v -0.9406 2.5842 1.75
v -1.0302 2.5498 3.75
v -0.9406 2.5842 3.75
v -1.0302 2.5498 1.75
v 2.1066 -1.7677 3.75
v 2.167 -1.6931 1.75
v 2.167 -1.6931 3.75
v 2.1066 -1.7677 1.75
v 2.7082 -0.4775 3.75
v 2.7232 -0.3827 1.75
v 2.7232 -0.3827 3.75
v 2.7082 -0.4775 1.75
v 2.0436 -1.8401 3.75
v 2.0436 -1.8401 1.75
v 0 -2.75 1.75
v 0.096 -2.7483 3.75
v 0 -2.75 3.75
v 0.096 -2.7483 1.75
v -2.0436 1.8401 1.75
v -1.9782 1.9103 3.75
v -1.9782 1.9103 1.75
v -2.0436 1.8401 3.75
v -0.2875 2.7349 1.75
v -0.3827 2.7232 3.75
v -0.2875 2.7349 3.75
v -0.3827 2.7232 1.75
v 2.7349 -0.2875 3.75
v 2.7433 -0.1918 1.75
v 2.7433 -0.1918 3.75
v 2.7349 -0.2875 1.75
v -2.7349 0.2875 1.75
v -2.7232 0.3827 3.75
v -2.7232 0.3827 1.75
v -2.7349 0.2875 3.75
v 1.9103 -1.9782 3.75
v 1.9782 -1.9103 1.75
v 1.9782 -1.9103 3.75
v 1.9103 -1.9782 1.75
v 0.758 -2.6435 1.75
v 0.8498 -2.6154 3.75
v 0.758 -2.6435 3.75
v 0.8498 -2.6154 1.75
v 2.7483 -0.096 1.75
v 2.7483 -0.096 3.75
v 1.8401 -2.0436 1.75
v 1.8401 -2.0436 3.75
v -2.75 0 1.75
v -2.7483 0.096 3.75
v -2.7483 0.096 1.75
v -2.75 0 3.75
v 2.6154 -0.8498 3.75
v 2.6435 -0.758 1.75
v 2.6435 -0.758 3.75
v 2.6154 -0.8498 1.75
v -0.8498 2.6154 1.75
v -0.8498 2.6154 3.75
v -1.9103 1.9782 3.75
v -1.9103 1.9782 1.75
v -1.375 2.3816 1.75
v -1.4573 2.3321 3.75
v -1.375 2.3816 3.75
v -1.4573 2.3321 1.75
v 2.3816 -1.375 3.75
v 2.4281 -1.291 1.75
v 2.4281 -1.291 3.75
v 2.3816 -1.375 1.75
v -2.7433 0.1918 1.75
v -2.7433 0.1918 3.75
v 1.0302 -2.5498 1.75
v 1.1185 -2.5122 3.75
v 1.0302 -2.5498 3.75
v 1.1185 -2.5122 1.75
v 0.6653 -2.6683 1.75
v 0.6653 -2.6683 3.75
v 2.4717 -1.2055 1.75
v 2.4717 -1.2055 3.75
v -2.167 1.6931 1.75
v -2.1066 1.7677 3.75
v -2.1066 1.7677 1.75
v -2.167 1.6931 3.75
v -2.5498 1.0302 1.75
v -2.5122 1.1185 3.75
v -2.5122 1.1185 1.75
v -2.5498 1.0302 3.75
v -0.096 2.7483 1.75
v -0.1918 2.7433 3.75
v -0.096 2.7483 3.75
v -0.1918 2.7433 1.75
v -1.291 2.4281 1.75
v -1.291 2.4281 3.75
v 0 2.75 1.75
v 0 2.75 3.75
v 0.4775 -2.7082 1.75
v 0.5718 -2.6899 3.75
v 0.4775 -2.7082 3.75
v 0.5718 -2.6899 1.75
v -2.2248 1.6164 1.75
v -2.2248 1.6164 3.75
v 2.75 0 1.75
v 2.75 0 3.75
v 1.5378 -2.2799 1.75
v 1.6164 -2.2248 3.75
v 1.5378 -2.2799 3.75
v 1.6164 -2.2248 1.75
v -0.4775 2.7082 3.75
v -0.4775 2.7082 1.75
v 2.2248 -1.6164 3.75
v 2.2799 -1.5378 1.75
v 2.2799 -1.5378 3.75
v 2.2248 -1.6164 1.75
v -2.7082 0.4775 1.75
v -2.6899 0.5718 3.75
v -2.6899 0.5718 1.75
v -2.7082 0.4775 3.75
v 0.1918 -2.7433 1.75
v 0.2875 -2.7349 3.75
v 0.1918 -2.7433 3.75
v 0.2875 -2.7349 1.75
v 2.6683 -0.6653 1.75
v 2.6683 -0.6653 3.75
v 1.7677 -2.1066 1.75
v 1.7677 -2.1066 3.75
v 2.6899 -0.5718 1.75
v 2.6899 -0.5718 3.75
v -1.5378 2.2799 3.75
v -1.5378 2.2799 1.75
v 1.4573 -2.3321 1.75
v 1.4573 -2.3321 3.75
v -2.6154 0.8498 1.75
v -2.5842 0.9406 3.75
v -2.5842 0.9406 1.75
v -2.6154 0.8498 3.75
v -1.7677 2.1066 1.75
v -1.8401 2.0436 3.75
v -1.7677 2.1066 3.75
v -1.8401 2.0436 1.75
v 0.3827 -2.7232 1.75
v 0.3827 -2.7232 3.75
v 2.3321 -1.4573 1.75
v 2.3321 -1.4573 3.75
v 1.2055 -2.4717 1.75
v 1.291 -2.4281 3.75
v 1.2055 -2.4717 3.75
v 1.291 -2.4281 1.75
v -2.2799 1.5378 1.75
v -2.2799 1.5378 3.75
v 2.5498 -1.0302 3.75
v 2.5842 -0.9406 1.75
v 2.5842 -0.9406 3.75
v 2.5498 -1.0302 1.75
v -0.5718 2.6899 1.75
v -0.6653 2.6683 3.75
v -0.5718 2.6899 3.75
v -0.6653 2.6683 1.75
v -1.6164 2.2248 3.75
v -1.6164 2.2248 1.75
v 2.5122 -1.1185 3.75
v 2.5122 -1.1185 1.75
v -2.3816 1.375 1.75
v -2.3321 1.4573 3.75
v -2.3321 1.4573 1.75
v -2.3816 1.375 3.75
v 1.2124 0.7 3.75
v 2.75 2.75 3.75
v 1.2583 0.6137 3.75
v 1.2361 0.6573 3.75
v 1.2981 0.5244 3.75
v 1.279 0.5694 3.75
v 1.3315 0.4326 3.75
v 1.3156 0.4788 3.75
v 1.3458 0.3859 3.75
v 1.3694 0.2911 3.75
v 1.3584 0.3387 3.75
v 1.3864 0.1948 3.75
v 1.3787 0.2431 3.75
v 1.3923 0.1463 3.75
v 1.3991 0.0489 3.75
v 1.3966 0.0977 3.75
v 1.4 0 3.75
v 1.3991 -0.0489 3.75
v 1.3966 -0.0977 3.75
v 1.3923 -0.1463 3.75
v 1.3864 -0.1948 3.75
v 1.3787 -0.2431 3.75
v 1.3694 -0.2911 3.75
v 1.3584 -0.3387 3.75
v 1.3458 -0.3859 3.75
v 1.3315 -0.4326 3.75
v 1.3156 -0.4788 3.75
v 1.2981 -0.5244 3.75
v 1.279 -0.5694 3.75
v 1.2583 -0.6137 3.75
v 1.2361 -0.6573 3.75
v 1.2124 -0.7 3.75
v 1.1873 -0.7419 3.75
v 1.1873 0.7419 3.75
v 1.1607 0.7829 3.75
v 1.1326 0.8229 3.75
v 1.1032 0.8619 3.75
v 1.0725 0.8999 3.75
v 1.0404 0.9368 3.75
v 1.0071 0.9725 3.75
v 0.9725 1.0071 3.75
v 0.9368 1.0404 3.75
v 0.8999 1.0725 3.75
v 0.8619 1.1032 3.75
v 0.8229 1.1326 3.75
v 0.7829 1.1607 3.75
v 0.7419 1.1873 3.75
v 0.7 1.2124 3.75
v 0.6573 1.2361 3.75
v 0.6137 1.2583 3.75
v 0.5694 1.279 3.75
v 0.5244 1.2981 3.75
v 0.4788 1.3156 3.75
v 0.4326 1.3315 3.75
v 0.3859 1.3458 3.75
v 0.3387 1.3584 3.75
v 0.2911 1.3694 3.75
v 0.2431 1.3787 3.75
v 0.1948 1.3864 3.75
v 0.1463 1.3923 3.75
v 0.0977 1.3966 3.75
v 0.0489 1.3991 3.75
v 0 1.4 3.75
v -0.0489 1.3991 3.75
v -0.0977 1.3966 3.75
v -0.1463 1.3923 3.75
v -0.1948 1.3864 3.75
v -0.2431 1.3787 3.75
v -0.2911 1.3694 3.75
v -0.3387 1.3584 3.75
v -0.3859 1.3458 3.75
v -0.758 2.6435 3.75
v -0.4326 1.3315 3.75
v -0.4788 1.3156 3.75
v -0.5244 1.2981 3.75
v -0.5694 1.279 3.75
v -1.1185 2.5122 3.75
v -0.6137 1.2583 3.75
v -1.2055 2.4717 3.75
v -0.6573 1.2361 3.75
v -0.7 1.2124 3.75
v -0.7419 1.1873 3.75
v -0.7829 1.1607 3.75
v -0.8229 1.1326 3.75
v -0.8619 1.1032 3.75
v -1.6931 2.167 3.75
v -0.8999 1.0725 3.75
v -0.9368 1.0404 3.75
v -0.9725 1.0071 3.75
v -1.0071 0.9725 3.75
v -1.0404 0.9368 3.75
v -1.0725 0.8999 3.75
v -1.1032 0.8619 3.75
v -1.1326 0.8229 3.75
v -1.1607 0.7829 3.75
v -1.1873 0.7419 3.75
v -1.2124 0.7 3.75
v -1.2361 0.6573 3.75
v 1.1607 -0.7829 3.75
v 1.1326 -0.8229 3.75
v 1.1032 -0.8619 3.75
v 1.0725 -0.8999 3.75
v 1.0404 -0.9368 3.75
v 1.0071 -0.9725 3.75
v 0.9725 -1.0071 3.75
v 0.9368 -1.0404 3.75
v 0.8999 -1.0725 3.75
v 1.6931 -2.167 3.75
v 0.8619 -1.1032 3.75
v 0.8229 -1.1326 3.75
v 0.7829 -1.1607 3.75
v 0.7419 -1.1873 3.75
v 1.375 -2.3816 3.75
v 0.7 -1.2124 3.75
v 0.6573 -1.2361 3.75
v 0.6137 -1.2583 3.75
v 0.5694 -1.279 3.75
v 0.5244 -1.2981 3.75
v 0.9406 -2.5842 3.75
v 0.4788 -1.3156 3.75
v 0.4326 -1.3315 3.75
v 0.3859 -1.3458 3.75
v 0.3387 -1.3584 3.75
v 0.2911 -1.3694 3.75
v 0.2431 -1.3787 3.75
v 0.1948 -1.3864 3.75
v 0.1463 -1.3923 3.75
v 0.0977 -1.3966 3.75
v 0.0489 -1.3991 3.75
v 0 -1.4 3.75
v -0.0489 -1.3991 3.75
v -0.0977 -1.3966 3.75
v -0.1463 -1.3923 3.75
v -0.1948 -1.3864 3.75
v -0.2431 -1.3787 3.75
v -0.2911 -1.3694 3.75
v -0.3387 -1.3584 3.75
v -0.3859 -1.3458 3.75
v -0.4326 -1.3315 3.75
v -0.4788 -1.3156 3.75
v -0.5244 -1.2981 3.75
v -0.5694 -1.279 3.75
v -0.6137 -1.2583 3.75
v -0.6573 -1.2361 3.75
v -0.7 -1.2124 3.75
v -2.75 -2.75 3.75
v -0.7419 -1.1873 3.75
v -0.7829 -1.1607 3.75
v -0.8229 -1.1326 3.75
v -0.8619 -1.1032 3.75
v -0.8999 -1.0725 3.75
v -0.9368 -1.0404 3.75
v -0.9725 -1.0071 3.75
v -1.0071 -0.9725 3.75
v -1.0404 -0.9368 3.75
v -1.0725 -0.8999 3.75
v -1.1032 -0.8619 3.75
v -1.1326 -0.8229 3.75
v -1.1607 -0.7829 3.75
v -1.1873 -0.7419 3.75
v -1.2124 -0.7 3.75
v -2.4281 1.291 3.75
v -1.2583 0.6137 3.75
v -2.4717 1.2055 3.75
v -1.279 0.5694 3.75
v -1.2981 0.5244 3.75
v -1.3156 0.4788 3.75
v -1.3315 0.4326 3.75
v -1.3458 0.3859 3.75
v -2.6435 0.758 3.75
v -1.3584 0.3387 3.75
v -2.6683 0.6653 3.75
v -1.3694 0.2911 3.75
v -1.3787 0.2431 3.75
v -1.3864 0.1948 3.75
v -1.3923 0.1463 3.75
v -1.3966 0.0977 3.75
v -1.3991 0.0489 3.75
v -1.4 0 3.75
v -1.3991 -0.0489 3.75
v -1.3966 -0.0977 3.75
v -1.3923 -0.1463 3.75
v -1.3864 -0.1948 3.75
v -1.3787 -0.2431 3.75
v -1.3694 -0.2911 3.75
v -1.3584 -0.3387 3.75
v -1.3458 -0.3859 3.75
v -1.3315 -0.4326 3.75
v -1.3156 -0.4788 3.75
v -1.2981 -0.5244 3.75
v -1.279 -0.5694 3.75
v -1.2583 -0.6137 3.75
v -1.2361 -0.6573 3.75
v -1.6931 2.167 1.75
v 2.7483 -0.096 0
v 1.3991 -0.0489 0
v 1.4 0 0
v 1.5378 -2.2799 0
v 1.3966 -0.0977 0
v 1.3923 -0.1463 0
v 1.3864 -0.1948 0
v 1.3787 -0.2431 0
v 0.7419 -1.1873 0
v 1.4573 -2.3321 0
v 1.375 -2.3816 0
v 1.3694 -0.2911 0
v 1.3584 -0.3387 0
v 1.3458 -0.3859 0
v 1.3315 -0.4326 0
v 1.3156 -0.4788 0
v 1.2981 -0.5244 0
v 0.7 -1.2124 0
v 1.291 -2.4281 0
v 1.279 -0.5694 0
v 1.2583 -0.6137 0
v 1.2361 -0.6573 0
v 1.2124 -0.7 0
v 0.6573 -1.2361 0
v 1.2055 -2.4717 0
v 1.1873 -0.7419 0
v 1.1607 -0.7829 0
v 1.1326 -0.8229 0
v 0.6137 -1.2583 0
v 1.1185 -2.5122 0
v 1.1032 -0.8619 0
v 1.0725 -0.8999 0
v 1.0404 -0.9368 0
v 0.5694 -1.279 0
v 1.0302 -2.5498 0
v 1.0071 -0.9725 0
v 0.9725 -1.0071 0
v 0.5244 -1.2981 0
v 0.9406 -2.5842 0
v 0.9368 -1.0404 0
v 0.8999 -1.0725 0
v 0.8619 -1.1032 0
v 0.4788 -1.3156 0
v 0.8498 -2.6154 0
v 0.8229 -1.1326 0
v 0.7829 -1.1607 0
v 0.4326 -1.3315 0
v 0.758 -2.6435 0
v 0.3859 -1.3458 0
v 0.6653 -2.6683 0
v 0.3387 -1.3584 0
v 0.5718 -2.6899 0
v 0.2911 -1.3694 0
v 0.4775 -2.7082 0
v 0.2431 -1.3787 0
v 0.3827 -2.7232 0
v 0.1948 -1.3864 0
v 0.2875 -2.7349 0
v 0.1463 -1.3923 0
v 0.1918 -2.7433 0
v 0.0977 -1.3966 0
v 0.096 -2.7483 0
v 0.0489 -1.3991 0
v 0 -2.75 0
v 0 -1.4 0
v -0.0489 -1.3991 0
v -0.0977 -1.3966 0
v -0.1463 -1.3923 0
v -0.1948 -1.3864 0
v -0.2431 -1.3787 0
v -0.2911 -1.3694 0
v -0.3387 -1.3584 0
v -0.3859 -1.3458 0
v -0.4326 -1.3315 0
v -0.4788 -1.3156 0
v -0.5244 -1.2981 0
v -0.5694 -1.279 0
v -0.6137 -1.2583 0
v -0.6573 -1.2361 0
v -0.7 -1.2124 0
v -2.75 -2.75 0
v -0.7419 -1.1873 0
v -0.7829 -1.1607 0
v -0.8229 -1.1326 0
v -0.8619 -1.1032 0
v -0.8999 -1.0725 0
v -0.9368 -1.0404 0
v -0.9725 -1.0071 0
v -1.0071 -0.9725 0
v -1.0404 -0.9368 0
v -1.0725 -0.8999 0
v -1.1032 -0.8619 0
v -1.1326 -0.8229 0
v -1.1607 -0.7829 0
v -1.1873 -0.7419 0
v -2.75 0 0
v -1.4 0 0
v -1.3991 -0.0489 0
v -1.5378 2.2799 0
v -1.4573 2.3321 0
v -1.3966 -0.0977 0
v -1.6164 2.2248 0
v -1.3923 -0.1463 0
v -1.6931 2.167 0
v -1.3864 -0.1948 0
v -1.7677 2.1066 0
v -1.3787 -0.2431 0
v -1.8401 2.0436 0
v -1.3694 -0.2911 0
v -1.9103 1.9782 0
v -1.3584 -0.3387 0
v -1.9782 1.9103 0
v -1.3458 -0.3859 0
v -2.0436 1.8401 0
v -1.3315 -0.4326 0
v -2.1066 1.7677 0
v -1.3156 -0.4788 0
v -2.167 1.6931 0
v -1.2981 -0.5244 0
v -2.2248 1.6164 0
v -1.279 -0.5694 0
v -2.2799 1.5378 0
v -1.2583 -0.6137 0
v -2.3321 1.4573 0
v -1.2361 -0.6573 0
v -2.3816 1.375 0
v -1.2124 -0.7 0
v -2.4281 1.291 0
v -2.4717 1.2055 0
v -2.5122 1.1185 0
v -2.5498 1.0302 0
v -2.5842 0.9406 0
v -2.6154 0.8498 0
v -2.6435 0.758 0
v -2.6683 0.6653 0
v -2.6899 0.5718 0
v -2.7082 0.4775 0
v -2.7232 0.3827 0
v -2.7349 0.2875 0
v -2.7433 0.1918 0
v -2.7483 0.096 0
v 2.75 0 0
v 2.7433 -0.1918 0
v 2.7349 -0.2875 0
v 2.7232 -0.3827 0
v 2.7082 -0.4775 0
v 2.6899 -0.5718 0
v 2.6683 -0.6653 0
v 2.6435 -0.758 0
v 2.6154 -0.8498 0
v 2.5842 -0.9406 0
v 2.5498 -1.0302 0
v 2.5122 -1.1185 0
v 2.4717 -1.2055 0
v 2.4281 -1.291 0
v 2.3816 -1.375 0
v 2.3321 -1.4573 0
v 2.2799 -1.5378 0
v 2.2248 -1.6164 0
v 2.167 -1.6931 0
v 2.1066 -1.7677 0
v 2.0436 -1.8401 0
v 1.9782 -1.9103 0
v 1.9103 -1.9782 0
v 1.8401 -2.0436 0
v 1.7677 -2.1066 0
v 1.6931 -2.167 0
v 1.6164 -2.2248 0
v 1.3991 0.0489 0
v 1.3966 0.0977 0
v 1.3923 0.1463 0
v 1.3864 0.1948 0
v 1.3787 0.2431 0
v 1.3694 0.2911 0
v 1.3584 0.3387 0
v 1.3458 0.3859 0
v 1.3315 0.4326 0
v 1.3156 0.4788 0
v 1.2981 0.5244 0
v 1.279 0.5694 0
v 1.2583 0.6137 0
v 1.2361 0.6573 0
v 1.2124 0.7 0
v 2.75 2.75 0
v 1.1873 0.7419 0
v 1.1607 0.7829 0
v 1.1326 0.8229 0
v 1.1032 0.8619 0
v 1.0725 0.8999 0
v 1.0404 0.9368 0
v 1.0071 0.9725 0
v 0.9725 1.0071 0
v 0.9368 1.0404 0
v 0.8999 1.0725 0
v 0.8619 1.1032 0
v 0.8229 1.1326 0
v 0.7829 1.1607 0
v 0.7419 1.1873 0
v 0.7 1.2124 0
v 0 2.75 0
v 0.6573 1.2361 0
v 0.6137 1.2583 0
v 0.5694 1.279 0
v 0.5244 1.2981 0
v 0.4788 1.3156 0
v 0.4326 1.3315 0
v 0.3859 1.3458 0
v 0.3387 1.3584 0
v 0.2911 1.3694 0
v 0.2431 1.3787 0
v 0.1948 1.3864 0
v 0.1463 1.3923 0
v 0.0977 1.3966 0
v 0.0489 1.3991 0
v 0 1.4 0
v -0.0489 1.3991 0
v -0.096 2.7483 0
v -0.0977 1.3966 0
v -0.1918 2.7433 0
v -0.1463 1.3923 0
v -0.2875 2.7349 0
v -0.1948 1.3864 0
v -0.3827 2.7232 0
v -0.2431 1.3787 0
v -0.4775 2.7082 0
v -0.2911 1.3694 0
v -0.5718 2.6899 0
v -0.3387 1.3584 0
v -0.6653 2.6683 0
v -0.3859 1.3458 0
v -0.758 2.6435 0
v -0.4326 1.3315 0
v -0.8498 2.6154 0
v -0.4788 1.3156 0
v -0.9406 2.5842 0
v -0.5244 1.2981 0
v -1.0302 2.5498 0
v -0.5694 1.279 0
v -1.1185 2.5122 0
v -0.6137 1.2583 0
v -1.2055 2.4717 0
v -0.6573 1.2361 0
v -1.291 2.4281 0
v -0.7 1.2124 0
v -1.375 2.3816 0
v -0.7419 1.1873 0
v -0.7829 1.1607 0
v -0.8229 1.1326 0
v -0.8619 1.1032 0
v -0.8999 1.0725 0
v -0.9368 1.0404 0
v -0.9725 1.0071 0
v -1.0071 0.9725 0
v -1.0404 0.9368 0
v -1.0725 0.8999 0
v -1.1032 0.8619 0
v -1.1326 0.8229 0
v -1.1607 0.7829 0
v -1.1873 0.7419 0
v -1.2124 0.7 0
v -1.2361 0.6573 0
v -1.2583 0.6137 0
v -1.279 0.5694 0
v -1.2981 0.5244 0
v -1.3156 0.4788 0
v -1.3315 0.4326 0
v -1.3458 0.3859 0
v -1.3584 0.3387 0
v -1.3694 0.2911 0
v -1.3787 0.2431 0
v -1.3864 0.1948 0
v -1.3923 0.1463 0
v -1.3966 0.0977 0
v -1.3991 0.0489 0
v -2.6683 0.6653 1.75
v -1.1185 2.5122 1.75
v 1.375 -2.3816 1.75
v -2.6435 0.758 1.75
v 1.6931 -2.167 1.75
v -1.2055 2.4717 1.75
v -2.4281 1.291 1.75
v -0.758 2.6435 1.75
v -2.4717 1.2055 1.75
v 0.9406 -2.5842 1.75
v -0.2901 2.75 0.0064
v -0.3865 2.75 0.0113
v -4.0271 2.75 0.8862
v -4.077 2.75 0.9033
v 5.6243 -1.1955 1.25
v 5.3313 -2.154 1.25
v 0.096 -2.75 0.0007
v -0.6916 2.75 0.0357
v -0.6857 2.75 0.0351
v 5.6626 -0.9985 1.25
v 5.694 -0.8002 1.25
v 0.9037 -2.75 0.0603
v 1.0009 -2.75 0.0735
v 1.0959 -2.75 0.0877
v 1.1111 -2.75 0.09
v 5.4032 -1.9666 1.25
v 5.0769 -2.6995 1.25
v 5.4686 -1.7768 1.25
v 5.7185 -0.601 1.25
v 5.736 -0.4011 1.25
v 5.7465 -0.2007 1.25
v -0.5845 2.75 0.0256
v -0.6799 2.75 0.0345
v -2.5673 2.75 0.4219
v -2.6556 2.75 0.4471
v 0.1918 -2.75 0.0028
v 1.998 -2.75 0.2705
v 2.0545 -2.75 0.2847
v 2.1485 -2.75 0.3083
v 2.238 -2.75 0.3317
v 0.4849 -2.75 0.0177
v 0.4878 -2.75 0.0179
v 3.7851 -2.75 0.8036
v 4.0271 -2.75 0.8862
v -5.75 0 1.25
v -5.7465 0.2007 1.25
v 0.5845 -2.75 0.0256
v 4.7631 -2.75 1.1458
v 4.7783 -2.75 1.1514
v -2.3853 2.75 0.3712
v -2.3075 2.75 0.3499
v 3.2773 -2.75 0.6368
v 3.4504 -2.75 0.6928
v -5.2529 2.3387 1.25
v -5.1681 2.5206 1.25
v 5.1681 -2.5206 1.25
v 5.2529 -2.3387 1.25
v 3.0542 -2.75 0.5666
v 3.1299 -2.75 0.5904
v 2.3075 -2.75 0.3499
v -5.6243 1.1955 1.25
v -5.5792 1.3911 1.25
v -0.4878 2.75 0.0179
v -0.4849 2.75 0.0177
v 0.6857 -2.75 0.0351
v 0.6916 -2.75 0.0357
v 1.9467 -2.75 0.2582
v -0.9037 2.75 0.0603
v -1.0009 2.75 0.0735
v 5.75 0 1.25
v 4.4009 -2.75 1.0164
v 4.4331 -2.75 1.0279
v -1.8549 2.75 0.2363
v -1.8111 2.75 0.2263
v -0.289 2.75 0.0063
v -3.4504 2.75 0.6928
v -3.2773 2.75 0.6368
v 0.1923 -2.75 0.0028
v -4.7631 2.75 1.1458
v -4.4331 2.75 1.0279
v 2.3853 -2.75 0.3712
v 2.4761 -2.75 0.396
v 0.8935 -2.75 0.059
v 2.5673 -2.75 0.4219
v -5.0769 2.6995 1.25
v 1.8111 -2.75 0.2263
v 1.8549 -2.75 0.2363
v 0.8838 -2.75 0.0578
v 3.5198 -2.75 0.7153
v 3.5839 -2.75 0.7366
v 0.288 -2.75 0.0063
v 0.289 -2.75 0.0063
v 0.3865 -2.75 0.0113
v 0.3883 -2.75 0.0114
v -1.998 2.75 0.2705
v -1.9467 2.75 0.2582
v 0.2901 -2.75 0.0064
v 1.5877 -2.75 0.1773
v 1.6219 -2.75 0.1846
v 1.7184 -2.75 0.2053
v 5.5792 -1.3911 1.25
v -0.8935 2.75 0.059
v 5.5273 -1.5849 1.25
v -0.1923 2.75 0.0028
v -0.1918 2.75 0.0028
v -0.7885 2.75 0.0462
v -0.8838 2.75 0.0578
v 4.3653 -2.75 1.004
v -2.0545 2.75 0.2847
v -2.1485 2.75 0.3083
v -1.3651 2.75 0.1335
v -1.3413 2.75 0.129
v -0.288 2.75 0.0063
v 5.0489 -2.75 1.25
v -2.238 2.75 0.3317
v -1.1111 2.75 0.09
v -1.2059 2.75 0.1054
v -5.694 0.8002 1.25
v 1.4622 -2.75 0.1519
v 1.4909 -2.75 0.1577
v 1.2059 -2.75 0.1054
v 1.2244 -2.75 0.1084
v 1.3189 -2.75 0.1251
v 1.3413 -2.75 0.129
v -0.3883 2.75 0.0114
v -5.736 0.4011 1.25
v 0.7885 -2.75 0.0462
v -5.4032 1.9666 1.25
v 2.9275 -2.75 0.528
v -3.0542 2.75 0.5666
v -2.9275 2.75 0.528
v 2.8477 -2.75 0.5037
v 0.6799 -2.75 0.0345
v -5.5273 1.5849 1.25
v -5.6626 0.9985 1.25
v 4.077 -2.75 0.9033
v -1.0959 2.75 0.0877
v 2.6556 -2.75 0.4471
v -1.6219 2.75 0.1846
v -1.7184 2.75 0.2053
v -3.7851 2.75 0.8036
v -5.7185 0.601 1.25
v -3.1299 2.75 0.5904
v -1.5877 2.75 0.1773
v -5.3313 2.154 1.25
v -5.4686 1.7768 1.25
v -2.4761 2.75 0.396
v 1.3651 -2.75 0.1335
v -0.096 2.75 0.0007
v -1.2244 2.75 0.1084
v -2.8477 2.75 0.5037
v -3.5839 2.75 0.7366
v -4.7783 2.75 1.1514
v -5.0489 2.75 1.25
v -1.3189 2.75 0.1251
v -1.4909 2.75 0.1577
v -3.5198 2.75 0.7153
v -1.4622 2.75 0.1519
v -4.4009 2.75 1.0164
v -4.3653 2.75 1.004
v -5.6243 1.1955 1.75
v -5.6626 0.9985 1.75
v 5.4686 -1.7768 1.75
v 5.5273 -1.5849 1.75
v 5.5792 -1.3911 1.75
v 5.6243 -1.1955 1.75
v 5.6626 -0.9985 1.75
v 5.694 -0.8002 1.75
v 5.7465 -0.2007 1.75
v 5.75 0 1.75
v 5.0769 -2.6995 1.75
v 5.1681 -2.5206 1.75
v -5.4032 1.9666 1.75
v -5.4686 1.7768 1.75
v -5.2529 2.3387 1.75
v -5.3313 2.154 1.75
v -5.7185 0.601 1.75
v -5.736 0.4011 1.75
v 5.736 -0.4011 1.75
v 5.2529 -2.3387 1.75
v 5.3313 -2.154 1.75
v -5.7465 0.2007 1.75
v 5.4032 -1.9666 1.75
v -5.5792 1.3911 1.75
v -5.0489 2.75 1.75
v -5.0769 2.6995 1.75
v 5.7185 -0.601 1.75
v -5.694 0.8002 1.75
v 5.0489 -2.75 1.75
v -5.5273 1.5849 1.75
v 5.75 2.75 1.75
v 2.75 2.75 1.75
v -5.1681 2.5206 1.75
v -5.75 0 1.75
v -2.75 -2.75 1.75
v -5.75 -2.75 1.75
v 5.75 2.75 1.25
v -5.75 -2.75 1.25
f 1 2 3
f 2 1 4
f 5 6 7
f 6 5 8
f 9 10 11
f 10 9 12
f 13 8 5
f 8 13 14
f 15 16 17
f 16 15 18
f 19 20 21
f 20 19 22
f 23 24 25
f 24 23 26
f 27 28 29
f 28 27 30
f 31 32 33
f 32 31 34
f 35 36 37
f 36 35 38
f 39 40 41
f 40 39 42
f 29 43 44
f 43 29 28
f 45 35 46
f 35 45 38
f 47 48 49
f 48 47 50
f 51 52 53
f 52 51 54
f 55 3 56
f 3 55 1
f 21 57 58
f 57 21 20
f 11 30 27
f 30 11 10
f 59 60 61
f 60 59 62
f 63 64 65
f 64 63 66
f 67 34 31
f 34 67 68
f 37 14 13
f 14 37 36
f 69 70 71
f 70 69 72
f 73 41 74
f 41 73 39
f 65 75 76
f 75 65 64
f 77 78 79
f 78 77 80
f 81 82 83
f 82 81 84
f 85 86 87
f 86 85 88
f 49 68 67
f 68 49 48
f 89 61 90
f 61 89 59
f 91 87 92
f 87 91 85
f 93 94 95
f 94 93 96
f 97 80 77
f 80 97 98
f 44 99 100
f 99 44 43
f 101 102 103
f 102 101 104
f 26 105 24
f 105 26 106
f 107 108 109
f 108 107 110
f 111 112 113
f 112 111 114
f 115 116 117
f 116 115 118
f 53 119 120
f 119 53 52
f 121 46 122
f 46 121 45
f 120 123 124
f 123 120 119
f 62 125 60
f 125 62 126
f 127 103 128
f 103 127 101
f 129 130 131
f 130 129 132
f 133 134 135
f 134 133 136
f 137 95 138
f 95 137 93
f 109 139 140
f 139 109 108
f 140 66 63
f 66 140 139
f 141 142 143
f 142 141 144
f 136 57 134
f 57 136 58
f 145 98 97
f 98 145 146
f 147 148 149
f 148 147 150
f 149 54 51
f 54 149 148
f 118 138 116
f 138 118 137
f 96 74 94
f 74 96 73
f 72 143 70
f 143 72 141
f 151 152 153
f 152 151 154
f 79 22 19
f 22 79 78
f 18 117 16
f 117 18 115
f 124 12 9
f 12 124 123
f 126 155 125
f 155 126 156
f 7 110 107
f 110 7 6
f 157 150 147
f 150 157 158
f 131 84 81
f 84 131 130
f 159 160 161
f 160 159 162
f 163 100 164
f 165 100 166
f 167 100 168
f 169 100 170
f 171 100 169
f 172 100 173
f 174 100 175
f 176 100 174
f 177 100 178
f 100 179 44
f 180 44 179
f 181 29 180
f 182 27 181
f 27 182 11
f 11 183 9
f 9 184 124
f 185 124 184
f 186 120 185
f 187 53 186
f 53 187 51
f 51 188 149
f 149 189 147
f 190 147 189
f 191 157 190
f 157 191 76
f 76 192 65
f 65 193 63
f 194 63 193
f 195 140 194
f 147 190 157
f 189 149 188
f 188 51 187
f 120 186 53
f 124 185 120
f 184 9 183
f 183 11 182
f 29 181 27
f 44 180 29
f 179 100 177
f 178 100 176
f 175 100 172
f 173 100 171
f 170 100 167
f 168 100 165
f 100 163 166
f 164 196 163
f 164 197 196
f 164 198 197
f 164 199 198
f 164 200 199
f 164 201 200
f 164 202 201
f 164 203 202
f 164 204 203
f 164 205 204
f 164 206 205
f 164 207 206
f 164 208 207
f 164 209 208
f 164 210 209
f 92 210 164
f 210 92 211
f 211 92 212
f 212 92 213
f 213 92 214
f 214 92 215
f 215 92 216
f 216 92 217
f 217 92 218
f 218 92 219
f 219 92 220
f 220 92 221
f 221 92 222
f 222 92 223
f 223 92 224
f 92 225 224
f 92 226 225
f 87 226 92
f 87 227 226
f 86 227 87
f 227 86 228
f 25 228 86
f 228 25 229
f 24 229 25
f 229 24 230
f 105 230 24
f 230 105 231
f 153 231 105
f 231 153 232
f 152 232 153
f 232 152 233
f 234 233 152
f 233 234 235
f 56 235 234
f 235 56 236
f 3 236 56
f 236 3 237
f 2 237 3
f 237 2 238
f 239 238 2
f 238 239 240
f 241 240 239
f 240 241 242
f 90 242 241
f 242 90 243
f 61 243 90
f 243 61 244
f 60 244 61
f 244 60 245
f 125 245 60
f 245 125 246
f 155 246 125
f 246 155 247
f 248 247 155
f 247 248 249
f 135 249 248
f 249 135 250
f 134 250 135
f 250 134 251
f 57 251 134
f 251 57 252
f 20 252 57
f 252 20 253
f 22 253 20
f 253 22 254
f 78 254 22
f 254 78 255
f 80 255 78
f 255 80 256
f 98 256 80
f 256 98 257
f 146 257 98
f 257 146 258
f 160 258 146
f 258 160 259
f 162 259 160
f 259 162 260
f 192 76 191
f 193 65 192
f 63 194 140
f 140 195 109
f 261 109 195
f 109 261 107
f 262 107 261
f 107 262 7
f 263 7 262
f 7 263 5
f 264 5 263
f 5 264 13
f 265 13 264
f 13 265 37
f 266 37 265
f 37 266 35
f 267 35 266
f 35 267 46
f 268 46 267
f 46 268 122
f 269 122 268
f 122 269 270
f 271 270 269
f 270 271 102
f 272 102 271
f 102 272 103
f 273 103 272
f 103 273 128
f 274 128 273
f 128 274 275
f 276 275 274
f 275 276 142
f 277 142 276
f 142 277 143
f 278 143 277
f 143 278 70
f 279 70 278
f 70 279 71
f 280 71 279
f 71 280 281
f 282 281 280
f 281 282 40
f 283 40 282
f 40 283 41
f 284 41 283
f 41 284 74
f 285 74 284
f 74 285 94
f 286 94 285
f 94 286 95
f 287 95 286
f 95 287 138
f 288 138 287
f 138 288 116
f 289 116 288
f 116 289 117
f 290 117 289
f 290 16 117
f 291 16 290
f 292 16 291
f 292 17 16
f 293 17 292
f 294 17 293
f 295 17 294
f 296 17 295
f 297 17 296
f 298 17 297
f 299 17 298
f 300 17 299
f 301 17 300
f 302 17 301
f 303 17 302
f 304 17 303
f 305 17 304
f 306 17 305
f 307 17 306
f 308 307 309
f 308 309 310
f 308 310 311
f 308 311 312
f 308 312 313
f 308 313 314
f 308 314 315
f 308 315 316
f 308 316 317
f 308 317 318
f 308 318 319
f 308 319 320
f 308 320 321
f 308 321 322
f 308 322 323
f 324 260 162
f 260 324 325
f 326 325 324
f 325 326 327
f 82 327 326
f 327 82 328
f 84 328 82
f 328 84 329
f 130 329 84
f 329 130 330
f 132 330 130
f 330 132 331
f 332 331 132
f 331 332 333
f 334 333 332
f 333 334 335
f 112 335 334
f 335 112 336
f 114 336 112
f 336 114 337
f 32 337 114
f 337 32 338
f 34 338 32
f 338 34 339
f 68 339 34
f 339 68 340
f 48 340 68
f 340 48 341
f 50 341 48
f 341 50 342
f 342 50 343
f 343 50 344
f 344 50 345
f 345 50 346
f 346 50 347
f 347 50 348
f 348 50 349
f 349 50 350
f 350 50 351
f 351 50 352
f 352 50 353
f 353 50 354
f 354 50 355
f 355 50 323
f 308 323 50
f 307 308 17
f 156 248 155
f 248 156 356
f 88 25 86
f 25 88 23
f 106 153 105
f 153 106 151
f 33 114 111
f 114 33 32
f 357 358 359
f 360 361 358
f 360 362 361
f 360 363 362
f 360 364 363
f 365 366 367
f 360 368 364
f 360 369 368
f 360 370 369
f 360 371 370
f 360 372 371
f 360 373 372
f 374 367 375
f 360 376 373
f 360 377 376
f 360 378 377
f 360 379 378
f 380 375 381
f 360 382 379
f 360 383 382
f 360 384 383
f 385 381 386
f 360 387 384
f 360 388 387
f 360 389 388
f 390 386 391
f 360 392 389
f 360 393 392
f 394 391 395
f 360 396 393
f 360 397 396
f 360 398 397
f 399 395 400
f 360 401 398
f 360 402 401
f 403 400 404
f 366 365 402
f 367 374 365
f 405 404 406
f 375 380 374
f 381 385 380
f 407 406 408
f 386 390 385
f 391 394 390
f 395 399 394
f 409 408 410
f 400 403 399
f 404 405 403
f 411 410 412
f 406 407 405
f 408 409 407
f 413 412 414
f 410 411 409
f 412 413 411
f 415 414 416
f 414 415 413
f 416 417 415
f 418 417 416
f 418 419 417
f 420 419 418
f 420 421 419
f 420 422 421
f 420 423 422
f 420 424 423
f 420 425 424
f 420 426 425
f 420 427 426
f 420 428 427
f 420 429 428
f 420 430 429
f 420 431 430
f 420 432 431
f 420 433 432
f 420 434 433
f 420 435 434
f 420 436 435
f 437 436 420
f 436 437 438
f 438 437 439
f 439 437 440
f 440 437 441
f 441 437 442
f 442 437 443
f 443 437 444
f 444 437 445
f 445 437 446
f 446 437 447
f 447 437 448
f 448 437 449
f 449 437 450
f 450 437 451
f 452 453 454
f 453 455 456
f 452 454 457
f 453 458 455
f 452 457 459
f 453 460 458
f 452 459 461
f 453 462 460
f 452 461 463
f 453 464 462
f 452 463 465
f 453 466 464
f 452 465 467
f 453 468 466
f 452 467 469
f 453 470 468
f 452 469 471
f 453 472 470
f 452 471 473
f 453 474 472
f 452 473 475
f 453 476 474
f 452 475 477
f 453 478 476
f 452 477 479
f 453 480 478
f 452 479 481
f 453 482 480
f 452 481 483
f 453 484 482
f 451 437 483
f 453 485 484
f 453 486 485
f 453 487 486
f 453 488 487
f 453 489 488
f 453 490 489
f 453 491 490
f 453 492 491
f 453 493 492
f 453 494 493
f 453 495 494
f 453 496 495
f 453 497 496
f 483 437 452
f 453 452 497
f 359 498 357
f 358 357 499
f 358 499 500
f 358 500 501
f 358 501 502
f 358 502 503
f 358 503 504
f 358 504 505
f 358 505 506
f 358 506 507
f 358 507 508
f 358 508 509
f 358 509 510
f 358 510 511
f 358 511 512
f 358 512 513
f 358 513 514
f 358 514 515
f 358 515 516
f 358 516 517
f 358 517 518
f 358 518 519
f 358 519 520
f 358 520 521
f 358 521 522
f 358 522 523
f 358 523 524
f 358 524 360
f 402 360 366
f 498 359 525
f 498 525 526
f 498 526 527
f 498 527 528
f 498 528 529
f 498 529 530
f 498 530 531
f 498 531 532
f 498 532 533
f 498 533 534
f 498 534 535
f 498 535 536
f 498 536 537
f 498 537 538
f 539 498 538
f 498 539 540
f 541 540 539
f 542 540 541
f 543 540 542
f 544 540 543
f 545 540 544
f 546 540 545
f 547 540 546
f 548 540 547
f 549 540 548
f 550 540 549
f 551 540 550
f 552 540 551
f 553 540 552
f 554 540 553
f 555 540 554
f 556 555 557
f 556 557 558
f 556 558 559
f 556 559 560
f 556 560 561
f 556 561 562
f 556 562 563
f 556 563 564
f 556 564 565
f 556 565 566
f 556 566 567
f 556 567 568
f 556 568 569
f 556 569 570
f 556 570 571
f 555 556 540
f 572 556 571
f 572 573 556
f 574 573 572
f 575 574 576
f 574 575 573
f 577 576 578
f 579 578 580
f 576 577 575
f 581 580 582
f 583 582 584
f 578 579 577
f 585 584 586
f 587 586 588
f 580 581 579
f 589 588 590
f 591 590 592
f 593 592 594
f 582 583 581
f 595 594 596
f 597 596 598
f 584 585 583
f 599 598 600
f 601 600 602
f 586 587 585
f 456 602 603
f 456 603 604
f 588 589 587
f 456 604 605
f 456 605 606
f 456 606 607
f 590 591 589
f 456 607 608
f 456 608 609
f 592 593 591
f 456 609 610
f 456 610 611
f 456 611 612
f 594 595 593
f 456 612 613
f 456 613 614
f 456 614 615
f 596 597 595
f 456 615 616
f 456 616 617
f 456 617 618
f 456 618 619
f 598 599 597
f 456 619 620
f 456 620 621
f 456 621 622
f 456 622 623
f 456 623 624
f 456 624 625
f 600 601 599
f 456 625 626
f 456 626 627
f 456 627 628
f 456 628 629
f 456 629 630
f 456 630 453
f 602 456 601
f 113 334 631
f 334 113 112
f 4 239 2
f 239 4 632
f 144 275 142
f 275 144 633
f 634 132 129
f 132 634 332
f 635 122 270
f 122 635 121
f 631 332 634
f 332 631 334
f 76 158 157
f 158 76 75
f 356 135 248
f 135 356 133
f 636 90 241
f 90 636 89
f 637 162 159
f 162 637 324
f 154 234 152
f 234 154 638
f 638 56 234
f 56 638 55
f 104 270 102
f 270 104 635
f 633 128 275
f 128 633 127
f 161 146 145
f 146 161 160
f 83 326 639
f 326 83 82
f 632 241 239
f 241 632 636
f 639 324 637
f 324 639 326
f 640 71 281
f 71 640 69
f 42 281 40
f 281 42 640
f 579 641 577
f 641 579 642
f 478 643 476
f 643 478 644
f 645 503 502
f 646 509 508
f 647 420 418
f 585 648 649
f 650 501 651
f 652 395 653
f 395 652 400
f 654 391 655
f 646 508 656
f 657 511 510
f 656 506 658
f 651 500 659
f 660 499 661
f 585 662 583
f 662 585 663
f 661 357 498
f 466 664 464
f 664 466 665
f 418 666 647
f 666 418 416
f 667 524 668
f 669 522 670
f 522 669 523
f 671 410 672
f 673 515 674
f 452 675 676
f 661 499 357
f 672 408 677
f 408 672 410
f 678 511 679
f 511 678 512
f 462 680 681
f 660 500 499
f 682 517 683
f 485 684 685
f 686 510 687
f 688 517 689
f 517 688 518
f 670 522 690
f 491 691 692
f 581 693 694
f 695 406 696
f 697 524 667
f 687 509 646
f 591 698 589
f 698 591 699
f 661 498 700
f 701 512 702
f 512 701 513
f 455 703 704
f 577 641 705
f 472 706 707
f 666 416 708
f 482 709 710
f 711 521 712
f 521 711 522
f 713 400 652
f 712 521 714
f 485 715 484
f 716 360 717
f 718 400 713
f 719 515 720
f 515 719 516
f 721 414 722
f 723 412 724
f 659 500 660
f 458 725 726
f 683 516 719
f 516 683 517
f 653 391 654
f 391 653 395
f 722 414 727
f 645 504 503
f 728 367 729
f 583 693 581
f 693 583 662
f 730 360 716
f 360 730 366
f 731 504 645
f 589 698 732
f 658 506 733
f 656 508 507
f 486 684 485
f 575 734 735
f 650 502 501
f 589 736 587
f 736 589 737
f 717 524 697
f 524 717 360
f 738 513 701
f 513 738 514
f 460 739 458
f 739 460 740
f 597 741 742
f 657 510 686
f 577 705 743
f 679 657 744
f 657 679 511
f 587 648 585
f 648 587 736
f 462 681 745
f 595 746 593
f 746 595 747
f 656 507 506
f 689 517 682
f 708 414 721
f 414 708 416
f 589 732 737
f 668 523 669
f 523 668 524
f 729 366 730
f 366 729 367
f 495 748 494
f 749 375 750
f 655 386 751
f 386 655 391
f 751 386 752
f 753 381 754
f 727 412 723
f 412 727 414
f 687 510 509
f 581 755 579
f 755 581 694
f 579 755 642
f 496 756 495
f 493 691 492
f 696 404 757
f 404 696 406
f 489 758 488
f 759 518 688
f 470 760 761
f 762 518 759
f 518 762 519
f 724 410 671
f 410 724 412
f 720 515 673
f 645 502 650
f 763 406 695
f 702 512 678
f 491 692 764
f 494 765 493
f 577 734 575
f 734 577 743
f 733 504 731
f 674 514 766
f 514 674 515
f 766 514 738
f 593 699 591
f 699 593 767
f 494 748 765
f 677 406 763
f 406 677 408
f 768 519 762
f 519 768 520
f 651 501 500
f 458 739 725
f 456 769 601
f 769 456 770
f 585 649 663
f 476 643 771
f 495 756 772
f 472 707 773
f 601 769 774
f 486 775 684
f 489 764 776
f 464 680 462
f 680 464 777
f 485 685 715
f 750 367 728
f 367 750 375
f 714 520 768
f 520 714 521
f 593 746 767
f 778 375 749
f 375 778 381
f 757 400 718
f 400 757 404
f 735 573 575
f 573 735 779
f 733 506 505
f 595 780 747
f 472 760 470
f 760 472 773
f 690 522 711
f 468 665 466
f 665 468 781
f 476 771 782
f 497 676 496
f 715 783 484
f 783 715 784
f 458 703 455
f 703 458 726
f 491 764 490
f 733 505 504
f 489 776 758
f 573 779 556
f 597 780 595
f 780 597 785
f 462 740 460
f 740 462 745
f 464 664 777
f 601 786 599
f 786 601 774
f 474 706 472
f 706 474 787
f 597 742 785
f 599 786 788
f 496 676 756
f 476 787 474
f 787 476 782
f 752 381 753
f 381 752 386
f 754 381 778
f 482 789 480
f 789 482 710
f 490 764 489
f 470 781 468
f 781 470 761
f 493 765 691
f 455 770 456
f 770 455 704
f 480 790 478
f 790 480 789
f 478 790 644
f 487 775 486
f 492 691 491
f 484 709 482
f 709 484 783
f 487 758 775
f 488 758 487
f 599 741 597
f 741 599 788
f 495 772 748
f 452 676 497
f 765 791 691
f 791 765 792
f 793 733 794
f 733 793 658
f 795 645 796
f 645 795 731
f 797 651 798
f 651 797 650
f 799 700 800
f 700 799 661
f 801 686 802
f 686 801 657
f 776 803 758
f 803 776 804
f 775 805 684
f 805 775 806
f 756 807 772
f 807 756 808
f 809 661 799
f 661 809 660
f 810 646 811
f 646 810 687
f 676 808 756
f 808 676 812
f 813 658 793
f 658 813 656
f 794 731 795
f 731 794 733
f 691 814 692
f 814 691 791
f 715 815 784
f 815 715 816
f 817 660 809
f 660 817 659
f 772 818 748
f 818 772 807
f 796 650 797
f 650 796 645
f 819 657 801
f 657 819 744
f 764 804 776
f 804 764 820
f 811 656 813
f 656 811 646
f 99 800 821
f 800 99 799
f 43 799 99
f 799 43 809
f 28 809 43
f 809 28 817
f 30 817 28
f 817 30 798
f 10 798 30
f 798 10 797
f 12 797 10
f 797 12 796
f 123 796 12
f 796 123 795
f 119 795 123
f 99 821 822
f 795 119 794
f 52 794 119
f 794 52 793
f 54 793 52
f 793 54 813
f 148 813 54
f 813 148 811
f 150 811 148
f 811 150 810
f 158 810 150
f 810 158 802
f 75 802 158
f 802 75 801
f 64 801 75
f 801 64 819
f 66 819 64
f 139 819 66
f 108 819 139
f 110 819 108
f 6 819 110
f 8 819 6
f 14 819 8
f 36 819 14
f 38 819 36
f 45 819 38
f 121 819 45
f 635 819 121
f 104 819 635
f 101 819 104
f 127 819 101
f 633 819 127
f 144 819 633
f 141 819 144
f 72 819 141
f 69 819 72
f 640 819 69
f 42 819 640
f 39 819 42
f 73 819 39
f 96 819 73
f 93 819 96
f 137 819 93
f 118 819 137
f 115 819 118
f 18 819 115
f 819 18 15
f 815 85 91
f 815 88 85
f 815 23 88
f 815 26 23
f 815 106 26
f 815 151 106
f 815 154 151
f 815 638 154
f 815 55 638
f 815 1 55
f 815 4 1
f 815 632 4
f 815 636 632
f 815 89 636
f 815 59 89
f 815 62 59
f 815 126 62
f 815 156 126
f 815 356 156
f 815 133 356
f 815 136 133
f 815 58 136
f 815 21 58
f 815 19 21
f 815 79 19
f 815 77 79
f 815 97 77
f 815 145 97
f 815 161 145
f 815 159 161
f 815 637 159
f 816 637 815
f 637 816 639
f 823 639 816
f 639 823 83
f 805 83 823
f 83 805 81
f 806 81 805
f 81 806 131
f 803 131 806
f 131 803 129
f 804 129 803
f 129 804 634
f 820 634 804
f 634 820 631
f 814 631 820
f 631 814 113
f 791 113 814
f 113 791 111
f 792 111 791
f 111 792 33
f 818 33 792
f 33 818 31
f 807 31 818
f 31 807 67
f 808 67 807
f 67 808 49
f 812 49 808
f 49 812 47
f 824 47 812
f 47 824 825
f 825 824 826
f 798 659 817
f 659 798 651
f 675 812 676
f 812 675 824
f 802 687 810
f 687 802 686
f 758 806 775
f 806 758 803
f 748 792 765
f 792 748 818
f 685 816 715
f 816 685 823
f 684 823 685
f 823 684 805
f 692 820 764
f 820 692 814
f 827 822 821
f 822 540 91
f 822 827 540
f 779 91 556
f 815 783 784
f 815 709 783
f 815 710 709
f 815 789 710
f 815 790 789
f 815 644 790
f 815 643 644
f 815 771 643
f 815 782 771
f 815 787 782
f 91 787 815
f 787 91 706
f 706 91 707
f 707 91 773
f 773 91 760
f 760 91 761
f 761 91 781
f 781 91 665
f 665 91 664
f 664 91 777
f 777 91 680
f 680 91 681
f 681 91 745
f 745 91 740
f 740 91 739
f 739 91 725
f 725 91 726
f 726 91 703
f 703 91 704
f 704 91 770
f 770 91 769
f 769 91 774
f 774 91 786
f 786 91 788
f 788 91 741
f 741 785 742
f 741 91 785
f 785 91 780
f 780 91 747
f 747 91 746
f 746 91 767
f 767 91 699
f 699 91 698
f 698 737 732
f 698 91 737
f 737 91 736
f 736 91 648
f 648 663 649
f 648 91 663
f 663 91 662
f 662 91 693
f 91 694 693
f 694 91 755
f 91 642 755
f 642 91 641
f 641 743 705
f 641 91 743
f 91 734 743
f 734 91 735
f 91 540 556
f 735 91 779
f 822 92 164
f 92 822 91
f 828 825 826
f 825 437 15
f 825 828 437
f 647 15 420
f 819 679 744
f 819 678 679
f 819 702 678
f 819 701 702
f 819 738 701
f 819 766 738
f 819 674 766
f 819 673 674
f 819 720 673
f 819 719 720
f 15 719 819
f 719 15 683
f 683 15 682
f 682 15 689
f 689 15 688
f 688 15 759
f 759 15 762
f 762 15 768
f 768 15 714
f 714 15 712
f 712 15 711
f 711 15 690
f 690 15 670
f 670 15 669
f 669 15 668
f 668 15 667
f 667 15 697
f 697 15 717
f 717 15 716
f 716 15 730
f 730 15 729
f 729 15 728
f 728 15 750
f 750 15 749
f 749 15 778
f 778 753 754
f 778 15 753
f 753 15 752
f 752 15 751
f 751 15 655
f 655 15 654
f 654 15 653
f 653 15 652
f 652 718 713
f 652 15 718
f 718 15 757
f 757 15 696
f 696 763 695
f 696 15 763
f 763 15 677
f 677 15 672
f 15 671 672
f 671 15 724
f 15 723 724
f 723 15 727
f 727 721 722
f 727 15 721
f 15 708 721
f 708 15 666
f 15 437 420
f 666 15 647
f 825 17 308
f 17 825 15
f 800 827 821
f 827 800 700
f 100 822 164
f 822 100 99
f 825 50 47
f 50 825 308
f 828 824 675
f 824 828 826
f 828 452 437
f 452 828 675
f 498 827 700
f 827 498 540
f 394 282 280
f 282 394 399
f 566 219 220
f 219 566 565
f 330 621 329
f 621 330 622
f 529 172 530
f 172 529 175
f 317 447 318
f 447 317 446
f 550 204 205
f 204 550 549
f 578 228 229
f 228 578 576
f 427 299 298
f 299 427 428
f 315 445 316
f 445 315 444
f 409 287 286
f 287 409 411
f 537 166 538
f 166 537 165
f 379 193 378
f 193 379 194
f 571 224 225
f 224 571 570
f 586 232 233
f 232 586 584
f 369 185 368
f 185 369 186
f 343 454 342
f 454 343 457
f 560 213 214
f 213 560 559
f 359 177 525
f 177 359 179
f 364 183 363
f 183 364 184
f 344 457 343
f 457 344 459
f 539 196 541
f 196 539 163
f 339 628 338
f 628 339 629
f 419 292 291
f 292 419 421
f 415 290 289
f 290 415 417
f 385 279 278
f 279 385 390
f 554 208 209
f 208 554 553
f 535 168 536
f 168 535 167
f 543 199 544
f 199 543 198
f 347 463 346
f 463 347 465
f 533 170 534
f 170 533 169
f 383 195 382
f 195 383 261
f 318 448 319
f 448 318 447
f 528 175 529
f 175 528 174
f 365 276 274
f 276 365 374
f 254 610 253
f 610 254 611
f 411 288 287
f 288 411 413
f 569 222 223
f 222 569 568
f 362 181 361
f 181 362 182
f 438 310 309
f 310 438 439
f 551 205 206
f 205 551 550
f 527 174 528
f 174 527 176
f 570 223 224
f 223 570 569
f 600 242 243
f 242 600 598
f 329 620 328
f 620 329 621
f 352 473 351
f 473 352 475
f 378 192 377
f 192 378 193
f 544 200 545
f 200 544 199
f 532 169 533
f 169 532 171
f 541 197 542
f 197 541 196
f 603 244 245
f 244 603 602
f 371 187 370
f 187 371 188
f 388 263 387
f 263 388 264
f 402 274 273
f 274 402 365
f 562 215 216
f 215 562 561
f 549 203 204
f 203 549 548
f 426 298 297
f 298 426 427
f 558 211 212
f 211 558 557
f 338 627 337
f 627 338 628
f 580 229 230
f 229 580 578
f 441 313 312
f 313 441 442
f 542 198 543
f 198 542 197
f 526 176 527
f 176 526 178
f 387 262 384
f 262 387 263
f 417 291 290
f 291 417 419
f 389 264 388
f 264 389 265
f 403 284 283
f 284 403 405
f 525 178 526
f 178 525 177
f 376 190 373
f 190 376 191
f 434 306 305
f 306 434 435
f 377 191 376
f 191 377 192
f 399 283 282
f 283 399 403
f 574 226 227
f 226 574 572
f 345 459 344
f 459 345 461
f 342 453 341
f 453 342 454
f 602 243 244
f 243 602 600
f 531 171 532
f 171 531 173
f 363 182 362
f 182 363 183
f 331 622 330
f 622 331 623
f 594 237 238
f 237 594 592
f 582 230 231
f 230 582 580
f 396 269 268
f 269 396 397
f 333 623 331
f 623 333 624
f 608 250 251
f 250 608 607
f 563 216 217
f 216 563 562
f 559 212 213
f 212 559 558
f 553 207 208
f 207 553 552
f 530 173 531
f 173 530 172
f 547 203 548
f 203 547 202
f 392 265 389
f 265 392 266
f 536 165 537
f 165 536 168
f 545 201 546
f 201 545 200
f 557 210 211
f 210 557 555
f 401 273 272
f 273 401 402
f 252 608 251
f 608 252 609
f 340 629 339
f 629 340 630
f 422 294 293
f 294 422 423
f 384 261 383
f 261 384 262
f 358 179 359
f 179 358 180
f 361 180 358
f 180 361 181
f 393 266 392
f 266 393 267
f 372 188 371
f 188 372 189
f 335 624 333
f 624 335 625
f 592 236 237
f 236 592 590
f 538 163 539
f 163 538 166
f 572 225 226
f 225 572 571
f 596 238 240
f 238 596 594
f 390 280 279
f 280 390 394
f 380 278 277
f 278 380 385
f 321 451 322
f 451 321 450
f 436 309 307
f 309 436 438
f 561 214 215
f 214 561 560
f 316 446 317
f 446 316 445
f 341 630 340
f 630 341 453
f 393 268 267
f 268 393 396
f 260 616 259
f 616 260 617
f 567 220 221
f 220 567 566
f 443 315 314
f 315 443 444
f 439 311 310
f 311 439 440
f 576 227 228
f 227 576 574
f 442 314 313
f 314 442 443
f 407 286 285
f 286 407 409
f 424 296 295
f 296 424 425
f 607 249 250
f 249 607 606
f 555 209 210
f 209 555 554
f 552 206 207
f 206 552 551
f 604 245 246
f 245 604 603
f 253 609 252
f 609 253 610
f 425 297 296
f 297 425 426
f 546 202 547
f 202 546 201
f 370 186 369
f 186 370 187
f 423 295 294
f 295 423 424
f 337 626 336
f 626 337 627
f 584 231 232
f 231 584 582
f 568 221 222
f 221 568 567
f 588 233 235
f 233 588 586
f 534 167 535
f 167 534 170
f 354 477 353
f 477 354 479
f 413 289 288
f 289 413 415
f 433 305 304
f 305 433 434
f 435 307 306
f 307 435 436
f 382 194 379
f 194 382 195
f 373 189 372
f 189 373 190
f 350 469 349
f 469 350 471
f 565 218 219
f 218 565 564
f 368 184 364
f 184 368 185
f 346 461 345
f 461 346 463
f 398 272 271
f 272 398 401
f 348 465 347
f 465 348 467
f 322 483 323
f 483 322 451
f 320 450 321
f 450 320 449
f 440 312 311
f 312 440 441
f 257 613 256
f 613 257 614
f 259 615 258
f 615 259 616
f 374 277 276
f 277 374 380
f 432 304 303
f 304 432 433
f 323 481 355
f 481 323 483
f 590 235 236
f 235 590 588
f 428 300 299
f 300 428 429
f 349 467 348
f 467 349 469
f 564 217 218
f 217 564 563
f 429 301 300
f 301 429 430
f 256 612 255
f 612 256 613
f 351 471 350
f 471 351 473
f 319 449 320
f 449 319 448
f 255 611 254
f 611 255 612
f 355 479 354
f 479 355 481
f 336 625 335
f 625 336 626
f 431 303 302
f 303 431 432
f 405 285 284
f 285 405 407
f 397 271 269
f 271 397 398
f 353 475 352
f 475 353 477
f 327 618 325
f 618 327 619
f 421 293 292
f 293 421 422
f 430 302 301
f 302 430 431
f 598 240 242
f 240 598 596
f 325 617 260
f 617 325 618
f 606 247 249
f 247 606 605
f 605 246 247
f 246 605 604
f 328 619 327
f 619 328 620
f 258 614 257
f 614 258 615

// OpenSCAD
/* Printable hammer-style t-nut by Tomi T. Salo <ttsalo@iki.fi> 2013 */

$fn=180;

slot_depth = 4;
slot_width = 6;
slot_total_width = 12;
slot_bottom_width = 6;
slot_lip = 2;
slot_shoulder = 0.5;
tol = 0.25;

module rect_nut(length) {
  translate([0, length/2, 0])
    rotate([90, 0, 0])
      linear_extrude(height=length)
        polygon([[-slot_width/2 + tol, slot_depth - tol], 
                 [slot_width/2 - tol, slot_depth - tol], 
                 [slot_width/2 - tol, slot_depth - slot_lip - tol],
                 [slot_total_width/2 - tol, slot_depth - slot_lip - tol],
                 [slot_total_width/2 - tol, 
                  slot_depth - slot_lip - slot_shoulder - tol],
                 [slot_bottom_width/2 - tol, 0],
                 [- slot_bottom_width/2 + tol, 0],
                 [- slot_total_width/2 + tol, 
                  slot_depth - slot_lip - slot_shoulder - tol],
                 [- slot_total_width/2 + tol, slot_depth - slot_lip - tol],
                 [- slot_width/2 + tol, slot_depth - slot_lip - tol],
                 ]);
}

module round_nut() {
  cylinder(r=slot_width/2-tol, h=slot_depth - tol);
  cylinder(r1=slot_bottom_width/2-tol, r2=slot_total_width/2-tol, 
           h=slot_depth - slot_lip - slot_shoulder - tol);
  translate([0, 0, slot_depth - slot_lip - slot_shoulder - tol])
  cylinder(r=slot_total_width/2-tol, 
           h=slot_shoulder);
}

module hammer_nut(hole_r=0) {
  intersection() {
    union () {
      round_nut();
      difference() {
        rect_nut(slot_width - 2*tol);
        translate([0, -slot_total_width, 0])
          cube([slot_total_width, slot_total_width, slot_depth]);
        translate([-slot_total_width, 0, 0])
          cube([slot_total_width, slot_total_width, slot_depth]);
      }
    }
    difference() {
      translate([- slot_total_width / 2, - (slot_width - tol*2) / 2, 0])
        cube([slot_total_width, slot_width - tol*2, slot_depth]);
      if (hole_r > 0) {
        cylinder(r=hole_r, h=slot_depth);
      }
    }
  }
}

hammer_nut(hole_r=1.4);
